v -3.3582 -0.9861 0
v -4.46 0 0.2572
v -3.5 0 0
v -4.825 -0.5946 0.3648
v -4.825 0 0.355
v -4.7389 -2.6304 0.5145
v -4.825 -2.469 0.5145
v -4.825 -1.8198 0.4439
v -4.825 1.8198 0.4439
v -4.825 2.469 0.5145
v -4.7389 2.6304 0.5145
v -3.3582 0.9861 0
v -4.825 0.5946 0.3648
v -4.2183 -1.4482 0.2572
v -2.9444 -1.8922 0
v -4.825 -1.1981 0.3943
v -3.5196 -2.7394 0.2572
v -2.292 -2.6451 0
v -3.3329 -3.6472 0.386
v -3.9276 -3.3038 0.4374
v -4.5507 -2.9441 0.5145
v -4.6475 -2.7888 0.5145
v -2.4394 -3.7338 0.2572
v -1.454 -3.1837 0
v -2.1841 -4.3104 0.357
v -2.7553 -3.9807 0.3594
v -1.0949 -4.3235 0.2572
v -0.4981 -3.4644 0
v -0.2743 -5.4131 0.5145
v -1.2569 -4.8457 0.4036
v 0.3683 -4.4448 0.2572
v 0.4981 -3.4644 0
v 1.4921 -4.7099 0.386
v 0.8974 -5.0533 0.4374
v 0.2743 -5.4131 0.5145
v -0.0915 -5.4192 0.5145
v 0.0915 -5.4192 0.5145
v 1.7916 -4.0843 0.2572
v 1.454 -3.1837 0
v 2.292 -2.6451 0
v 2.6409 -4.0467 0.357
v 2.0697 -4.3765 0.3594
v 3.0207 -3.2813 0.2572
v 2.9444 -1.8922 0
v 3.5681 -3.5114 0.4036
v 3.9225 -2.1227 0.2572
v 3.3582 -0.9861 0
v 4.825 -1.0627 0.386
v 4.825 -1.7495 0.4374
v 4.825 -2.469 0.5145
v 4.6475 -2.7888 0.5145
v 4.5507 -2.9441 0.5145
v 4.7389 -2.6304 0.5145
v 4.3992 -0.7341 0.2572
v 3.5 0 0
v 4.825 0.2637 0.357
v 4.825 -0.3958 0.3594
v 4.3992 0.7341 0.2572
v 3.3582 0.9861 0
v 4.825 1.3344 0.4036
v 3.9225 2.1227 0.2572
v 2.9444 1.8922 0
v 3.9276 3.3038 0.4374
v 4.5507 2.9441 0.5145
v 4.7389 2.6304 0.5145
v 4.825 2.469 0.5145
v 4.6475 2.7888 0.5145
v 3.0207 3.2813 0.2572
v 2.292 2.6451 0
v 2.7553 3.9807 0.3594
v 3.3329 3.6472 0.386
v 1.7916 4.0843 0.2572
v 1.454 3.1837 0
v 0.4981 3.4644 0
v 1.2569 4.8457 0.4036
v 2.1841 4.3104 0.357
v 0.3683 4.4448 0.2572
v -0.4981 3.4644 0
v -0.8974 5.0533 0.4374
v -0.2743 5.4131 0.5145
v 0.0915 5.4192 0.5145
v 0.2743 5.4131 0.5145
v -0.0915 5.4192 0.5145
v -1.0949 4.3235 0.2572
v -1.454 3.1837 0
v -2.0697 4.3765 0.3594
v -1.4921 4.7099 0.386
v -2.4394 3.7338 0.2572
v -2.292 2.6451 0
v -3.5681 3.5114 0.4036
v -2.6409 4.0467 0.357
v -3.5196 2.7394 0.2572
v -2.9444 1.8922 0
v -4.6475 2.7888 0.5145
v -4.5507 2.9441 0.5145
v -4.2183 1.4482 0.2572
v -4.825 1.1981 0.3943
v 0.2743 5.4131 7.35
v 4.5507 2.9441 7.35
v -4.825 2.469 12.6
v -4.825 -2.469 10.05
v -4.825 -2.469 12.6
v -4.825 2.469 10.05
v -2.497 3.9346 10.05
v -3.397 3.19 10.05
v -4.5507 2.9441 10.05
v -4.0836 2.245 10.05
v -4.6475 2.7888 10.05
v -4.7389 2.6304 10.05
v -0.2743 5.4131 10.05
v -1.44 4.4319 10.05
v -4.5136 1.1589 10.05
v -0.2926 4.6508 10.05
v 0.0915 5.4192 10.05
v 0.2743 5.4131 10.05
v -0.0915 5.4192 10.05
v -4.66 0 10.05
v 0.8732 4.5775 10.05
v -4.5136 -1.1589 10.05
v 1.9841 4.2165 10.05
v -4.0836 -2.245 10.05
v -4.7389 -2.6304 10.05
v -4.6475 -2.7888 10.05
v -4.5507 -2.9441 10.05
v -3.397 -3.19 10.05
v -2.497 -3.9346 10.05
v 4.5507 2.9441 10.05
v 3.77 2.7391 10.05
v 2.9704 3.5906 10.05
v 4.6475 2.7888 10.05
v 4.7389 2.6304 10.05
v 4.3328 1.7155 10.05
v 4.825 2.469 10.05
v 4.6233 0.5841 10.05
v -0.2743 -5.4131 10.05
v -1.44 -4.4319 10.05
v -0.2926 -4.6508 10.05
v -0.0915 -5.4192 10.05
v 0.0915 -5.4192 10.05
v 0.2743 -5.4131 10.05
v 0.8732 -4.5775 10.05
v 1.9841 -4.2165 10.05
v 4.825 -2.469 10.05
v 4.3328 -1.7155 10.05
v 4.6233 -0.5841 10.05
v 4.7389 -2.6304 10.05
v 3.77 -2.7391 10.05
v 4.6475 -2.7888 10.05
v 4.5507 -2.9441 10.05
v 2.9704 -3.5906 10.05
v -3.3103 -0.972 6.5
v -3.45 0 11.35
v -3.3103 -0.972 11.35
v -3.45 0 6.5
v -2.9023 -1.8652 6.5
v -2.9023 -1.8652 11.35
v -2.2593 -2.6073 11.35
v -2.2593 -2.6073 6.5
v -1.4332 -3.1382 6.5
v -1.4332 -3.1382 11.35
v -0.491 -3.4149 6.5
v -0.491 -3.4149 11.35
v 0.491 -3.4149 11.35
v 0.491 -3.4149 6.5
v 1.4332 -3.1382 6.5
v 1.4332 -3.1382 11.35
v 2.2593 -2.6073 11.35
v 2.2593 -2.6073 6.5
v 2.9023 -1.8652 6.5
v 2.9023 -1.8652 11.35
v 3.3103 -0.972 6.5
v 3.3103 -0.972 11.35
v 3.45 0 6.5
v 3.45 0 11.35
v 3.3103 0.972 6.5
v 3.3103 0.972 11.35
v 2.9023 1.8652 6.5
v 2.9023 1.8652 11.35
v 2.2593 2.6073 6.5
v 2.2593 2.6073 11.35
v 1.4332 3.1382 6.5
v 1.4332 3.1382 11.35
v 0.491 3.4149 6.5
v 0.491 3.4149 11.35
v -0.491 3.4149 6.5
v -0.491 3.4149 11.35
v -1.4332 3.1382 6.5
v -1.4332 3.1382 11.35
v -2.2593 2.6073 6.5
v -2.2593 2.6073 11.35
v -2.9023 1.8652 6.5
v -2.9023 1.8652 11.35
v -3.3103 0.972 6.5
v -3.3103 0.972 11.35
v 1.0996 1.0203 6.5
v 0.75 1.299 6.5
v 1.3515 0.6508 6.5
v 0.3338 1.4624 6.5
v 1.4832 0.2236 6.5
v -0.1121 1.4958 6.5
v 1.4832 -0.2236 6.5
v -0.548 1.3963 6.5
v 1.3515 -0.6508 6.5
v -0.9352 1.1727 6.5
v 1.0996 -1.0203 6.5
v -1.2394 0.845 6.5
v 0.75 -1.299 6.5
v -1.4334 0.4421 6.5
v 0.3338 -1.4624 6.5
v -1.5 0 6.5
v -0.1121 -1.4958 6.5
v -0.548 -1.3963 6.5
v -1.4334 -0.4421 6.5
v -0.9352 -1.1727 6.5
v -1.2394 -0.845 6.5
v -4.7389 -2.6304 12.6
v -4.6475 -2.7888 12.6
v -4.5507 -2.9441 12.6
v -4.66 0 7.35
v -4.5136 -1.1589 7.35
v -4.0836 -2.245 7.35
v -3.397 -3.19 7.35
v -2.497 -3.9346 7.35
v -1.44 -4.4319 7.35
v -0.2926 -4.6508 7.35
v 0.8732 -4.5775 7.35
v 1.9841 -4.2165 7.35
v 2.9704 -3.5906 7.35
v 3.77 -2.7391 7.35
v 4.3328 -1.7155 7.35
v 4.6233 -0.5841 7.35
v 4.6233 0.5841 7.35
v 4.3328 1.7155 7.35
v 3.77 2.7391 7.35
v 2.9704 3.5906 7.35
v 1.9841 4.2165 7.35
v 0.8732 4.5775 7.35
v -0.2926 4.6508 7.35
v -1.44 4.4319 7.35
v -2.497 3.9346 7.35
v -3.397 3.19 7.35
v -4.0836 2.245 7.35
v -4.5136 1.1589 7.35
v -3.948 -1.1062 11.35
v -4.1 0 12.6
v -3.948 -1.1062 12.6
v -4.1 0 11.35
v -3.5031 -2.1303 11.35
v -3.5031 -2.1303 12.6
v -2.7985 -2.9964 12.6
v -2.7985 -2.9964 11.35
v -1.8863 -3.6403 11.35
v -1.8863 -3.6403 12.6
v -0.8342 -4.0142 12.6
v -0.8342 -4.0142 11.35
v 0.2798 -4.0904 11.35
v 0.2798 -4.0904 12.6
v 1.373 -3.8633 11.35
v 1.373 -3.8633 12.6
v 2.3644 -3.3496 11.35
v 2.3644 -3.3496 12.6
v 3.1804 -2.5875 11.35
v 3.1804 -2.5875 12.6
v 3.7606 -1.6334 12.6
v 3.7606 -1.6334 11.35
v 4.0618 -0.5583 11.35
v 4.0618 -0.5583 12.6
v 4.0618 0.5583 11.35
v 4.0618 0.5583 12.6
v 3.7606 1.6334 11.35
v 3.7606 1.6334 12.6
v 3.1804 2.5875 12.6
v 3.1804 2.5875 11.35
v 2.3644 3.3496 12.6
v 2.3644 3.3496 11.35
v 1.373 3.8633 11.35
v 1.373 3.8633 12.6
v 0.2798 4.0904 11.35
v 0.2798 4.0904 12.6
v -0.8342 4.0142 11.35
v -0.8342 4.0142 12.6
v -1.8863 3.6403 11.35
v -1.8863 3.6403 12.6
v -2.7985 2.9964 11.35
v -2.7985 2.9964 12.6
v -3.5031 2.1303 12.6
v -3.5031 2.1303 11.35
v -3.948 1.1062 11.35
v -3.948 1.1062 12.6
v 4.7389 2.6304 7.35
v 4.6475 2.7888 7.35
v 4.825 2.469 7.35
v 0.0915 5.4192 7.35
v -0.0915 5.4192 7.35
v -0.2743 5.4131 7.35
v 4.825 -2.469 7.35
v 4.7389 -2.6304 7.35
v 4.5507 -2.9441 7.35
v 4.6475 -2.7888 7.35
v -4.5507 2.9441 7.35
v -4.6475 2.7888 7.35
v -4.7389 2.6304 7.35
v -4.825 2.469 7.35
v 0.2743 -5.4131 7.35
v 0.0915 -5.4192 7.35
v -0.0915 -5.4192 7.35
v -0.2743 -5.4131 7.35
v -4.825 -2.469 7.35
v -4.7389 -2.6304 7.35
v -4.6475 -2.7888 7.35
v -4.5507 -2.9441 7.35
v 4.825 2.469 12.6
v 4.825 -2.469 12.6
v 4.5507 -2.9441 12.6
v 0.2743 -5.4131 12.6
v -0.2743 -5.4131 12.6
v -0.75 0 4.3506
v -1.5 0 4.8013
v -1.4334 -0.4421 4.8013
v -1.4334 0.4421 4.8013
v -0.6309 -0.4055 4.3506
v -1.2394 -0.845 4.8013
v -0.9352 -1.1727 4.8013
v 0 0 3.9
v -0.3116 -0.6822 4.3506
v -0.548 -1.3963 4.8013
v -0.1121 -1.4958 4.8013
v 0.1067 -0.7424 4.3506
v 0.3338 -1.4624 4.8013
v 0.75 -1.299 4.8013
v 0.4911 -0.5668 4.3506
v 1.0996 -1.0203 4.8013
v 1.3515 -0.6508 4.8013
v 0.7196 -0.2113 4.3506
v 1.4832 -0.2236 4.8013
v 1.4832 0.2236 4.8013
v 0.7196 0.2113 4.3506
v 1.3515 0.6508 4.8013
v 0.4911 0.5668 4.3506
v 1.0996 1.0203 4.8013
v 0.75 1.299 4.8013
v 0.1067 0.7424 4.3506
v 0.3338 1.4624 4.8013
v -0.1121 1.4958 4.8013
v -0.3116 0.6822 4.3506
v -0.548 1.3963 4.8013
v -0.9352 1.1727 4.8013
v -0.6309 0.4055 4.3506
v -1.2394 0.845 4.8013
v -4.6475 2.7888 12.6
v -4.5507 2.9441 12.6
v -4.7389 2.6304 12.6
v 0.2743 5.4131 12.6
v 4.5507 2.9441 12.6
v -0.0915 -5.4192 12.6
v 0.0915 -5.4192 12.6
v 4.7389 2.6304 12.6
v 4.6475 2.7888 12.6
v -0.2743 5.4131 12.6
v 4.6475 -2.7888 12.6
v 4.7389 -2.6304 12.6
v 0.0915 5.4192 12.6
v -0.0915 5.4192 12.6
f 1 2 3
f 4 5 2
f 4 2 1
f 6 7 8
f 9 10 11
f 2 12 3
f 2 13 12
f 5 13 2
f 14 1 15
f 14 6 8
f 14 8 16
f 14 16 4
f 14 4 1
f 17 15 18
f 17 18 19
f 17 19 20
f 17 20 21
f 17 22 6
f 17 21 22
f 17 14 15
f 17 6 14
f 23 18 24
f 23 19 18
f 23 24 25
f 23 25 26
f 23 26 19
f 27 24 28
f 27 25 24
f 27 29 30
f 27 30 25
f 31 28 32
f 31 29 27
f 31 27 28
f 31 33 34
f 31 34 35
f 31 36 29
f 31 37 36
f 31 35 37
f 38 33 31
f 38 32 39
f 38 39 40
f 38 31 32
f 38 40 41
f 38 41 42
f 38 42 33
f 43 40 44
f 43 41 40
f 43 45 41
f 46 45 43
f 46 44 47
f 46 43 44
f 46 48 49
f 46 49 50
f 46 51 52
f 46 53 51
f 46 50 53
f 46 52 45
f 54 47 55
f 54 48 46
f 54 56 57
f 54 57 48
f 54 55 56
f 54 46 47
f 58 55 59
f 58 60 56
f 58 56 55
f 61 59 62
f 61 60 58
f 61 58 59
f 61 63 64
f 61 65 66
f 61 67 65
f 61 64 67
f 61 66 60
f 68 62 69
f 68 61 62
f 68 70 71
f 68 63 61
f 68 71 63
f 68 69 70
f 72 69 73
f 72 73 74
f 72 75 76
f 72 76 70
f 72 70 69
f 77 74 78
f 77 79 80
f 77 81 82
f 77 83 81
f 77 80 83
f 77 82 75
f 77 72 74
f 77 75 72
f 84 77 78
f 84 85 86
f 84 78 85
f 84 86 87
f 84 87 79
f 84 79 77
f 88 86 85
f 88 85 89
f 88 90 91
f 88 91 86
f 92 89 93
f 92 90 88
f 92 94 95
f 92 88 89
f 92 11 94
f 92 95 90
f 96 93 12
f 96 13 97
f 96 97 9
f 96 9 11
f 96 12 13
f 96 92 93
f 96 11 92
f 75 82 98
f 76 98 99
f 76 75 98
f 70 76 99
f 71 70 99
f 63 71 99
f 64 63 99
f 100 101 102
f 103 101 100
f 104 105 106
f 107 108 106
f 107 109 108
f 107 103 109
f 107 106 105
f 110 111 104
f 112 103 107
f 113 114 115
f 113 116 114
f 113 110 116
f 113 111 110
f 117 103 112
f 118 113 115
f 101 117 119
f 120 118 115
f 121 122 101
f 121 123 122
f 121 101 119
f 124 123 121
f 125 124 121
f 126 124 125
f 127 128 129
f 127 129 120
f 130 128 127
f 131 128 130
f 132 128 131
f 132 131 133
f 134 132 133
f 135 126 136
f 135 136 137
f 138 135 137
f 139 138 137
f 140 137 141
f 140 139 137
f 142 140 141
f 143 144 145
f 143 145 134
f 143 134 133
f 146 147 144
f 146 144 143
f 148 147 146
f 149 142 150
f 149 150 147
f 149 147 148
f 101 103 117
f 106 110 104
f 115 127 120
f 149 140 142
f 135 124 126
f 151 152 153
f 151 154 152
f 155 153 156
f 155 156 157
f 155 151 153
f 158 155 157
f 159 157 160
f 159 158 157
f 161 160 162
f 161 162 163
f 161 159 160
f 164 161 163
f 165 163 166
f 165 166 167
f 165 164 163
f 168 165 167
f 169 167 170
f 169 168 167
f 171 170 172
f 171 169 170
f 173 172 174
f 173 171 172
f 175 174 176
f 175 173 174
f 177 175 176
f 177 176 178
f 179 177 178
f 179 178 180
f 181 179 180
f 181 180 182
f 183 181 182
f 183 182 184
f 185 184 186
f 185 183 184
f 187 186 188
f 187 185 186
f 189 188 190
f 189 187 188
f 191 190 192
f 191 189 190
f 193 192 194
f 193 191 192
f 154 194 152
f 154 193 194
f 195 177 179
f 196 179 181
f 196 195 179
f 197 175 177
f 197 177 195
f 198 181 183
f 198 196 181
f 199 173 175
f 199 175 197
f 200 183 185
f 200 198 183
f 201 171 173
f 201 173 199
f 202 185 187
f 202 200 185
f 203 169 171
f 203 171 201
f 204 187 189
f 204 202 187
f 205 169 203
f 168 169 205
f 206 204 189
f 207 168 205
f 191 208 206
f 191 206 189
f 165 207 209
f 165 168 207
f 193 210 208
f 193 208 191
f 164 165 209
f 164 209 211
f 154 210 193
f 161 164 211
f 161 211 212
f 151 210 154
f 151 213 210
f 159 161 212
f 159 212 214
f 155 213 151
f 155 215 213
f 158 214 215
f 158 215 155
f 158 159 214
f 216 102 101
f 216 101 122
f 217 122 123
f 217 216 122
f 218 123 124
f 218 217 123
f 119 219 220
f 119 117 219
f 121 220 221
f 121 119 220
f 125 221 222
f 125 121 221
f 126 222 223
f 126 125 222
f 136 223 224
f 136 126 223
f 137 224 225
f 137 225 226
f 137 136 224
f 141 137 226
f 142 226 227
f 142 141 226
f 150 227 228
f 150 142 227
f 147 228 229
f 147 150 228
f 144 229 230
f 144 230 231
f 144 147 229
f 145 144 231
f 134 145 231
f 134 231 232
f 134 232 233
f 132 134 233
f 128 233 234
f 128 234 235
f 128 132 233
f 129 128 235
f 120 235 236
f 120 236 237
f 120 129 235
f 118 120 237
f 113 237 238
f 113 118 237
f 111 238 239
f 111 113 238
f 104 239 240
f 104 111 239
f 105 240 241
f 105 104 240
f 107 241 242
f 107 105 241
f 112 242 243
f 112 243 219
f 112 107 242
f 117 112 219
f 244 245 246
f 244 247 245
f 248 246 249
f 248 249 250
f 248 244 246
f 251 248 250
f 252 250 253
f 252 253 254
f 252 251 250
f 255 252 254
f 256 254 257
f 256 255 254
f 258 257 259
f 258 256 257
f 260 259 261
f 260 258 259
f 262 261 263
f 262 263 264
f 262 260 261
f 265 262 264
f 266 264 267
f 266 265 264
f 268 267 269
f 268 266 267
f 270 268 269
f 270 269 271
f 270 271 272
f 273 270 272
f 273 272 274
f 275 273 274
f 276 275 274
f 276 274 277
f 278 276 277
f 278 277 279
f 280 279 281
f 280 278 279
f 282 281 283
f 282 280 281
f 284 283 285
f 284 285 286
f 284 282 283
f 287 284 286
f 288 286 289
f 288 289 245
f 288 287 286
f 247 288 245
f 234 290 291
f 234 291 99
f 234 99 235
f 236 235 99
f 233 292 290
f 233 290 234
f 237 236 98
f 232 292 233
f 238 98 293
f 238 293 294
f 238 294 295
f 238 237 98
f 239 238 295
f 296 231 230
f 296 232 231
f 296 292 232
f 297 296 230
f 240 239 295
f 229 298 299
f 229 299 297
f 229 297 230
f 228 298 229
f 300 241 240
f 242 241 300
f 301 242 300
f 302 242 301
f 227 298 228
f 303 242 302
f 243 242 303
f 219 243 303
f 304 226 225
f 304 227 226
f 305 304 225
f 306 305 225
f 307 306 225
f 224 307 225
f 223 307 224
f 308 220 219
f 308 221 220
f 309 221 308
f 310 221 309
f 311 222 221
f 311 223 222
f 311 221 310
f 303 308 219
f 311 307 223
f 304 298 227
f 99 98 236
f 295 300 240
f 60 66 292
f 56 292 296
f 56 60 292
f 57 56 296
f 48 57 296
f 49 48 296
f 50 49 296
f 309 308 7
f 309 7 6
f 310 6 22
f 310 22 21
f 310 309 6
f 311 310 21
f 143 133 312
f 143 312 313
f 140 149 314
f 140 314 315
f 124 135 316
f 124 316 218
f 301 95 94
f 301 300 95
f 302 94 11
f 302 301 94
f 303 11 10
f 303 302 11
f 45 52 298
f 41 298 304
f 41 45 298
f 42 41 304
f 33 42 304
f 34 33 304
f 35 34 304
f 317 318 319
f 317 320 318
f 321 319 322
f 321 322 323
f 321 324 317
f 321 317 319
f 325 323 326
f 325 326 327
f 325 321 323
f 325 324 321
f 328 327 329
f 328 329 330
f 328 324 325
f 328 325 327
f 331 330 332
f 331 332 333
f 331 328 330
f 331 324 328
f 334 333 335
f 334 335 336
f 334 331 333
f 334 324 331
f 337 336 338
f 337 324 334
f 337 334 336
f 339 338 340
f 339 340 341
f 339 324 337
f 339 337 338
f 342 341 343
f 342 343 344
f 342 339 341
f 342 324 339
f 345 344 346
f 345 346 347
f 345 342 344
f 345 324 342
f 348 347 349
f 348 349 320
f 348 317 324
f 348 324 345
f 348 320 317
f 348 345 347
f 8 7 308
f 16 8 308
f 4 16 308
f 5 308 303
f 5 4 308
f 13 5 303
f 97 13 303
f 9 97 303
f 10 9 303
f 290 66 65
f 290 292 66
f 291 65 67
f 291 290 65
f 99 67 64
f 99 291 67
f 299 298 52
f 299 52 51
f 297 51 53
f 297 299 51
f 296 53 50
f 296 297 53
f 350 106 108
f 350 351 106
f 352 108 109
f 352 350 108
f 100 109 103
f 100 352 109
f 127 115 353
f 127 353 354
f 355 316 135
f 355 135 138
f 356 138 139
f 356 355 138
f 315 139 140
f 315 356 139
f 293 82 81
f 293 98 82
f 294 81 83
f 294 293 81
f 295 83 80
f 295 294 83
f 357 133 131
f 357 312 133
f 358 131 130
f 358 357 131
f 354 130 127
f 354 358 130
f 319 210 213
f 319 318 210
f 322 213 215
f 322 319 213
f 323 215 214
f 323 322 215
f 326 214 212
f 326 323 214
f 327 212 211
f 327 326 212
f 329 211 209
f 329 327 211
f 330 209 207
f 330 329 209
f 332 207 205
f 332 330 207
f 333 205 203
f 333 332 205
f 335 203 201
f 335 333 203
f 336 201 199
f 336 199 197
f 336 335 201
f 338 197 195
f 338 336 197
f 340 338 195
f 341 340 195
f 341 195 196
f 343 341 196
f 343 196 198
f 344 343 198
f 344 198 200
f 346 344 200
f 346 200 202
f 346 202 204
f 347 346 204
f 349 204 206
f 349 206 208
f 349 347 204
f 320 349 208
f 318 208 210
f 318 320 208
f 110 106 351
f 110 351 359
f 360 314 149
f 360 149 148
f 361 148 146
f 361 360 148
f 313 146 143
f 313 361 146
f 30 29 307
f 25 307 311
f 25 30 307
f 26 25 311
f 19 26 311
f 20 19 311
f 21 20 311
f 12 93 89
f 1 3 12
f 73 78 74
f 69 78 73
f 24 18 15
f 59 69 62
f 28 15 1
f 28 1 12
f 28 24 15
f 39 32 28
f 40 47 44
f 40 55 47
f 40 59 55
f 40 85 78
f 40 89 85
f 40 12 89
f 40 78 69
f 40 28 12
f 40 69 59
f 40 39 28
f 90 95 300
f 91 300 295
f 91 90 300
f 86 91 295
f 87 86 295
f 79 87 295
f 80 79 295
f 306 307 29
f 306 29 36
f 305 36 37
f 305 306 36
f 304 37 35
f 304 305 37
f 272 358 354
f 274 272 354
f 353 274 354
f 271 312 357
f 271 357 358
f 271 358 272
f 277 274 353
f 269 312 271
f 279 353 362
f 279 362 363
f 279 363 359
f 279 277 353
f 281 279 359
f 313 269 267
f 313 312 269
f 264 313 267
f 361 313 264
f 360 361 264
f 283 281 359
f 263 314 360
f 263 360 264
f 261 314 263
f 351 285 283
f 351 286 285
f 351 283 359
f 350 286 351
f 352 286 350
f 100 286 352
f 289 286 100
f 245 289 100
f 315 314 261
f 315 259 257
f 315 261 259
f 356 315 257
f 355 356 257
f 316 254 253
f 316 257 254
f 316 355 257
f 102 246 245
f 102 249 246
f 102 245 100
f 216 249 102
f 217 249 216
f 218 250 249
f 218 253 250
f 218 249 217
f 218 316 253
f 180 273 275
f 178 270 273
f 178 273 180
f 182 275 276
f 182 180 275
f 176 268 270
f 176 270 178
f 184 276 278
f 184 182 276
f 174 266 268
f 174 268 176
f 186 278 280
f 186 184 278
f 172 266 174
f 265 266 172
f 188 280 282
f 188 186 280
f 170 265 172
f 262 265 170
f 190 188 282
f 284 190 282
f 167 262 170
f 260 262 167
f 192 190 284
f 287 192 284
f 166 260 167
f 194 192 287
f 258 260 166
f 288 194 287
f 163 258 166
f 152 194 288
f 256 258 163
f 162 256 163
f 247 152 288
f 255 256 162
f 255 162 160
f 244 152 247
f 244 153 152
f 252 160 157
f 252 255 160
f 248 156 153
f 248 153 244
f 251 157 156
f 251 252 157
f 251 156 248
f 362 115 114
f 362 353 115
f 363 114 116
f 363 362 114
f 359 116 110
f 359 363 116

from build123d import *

# Parameters (mm, degrees)
SKETCH2_OUTSIDE_W = 16.808
SKETCH2_OUTSIDE_H = 16.808
EXTRUDE2_DEPTH    = 15.748315158


with BuildPart() as part:
    # Sketch1 → Revolve1 (revolve)
    with BuildSketch(Plane(origin=(0, 0, 0), x_dir=(0, 0, -1), z_dir=(1, 0, 0)), mode=Mode.PRIVATE) as revolve1_sk:
        Polygon((0, 0), (0, 3.5), (-0.514462449, 5.42), (-7.35, 5.42), (-7.35, 4.66), (-10.05, 4.66), (-10.05, 5.42), (-12.6, 5.42), (-12.6, 4.1), (-11.35, 4.1), (-11.35, 3.45), (-6.5, 3.45), (-6.5, 1.5), (-4.801290929, 1.5), (-3.9, 0), align=None)
    revolve(revolve1_sk.sketch.rotate(Axis((0, 0, 0), (0, 0, 1)), 90), axis=Axis((0, 0, 0), (0, 0, 1)))

    # Sketch2 outside → Extrude2 (cut, through all)
    with BuildSketch(Plane(origin=(0, 0, 0), x_dir=(-1, 0, 0), z_dir=(0, 0, -1))):
        Rectangle(SKETCH2_OUTSIDE_W, SKETCH2_OUTSIDE_H)
        Polygon((4.825, 2.785715049), (0, 5.571430098), (-4.825, 2.785715049), (-4.825, -2.785715049), (0, -5.571430098), (4.825, -2.785715049), align=None, mode=Mode.SUBTRACT)
    extrude(amount=-EXTRUDE2_DEPTH, mode=Mode.SUBTRACT)


solid = part.part
